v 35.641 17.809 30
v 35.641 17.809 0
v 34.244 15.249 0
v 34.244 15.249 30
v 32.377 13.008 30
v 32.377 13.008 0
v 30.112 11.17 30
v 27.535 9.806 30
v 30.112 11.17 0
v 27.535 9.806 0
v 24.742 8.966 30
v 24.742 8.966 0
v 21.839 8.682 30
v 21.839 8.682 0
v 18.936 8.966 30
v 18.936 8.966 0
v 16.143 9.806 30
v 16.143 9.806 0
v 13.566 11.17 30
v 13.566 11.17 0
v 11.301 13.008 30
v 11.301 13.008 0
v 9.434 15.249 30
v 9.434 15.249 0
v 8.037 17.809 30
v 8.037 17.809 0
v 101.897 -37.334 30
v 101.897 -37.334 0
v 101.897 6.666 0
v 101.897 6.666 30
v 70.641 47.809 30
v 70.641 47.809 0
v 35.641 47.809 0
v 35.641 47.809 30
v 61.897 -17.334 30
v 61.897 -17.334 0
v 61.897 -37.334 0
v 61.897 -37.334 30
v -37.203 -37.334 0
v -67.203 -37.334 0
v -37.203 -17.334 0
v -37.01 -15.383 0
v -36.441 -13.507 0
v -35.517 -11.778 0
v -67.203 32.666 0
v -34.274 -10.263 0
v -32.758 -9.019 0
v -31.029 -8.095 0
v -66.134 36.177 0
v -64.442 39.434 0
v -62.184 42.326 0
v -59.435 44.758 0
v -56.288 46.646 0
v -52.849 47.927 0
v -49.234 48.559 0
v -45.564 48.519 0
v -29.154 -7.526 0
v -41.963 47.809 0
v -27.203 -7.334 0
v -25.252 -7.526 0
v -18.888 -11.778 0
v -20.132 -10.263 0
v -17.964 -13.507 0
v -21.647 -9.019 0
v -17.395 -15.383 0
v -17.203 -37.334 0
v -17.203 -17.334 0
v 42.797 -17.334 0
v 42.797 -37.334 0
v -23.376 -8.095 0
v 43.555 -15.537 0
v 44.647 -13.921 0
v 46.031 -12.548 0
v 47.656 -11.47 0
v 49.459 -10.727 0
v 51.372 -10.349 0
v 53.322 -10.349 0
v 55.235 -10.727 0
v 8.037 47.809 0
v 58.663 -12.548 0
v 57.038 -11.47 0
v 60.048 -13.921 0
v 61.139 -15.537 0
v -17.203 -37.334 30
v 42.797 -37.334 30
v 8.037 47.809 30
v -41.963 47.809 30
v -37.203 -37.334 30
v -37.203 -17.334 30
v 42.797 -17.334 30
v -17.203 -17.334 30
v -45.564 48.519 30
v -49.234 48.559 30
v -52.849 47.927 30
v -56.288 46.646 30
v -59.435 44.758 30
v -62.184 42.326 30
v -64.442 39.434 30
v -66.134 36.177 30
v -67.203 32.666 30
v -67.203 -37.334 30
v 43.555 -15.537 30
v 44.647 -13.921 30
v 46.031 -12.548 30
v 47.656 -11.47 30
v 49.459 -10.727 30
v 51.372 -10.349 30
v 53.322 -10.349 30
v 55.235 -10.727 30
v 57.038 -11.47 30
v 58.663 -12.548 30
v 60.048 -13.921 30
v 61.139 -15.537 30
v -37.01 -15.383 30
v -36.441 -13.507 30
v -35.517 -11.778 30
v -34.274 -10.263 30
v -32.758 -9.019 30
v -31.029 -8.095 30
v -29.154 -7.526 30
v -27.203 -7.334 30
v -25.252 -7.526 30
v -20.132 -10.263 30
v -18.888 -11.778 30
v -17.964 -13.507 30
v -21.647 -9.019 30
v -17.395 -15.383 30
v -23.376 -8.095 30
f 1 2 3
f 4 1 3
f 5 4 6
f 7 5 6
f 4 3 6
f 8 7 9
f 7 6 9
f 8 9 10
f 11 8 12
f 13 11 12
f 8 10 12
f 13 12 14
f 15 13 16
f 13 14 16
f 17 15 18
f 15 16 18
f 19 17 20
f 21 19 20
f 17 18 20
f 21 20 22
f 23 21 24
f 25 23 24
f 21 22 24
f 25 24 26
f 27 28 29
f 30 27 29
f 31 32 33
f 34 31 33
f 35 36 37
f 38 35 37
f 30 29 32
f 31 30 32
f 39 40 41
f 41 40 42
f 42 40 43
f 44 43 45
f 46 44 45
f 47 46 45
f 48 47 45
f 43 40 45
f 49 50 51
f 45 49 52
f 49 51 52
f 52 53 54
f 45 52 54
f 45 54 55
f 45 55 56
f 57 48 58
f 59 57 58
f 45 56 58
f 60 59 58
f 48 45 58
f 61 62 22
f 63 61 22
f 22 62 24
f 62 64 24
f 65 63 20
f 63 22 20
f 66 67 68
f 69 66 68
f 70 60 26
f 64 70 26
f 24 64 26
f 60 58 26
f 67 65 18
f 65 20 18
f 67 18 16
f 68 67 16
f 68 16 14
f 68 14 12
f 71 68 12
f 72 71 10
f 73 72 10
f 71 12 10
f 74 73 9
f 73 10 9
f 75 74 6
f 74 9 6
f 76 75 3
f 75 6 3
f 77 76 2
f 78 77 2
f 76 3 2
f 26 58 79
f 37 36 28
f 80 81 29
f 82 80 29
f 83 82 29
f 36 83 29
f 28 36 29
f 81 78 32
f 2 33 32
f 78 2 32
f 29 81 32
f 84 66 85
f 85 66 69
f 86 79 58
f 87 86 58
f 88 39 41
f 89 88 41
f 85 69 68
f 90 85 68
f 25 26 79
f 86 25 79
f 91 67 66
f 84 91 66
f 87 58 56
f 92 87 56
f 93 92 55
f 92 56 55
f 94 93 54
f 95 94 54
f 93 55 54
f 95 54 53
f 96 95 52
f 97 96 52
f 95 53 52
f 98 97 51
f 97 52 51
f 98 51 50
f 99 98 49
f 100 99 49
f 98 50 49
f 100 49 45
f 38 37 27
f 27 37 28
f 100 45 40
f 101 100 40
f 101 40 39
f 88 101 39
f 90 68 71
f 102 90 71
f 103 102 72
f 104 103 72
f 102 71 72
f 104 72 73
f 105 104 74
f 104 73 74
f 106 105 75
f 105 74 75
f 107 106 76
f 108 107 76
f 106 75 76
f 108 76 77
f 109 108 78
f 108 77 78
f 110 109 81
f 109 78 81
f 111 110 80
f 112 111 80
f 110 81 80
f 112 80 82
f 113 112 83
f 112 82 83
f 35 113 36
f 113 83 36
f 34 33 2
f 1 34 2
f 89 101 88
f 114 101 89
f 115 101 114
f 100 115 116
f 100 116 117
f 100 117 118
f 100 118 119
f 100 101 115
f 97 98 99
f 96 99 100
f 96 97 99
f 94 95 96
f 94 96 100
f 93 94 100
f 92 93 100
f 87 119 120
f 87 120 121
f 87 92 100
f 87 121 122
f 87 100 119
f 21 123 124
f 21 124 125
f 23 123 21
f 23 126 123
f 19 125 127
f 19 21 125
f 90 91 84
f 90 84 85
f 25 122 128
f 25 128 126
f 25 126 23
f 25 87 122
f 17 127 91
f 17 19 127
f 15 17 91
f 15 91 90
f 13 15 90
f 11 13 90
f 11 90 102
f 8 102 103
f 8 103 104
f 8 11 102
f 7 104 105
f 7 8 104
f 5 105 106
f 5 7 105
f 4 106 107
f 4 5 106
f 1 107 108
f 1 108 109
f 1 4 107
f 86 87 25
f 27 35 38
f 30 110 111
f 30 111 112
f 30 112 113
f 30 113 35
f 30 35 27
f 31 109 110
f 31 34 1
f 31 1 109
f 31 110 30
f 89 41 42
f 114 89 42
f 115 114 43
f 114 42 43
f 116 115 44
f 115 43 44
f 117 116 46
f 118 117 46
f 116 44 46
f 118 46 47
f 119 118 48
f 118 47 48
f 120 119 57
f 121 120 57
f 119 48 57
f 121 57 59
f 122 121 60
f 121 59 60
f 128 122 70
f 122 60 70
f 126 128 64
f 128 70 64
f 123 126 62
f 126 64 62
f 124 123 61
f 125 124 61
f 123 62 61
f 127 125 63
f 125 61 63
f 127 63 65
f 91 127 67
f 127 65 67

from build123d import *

# Parameters (mm, degrees)
F1_DEPTH = 30


with BuildPart() as f1:
    # F0 (on Top) → F1 (new body)
    with BuildSketch(Plane.XY):
        with BuildLine():
            Line((8.036751, 47.808975), (-41.963249, 47.808975))
            ThreePointArc((-41.963249, 47.808975), (-57.904896, 45.774272), (-67.202643, 32.665953))
            Line((-67.202643, 32.665953), (-67.202643, -37.334047))
            Line((-67.202643, -37.334047), (-37.202643, -37.334047))
            Line((-37.202643, -37.334047), (-37.202643, -17.334047))
            ThreePointArc((-37.202643, -17.334047), (-27.202643, -7.334047), (-17.202643, -17.334047))
            Line((-17.202643, -17.334047), (-17.202643, -37.334047))
            Line((-17.202643, -37.334047), (42.797357, -37.334047))
            Line((42.797357, -37.334047), (42.797357, -17.334047))
            ThreePointArc((42.797357, -17.334047), (52.347088, -10.300972), (61.896819, -17.334047))
            Line((61.896819, -17.334047), (61.896819, -37.334047))
            Line((61.896819, -37.334047), (101.896819, -37.334047))
            Line((101.896819, -37.334047), (101.896819, 6.665953))
            Line((101.896819, 6.665953), (70.641249, 47.808975))
            Line((70.641249, 47.808975), (35.641249, 47.808975))
            Line((35.641249, 47.808975), (35.641249, 17.808975))
            ThreePointArc((35.641249, 17.808975), (21.839, 8.682468), (8.036751, 17.808975))
            Line((8.036751, 17.808975), (8.036751, 47.808975))
        make_face()
    extrude(amount=F1_DEPTH)


solid = f1.part
